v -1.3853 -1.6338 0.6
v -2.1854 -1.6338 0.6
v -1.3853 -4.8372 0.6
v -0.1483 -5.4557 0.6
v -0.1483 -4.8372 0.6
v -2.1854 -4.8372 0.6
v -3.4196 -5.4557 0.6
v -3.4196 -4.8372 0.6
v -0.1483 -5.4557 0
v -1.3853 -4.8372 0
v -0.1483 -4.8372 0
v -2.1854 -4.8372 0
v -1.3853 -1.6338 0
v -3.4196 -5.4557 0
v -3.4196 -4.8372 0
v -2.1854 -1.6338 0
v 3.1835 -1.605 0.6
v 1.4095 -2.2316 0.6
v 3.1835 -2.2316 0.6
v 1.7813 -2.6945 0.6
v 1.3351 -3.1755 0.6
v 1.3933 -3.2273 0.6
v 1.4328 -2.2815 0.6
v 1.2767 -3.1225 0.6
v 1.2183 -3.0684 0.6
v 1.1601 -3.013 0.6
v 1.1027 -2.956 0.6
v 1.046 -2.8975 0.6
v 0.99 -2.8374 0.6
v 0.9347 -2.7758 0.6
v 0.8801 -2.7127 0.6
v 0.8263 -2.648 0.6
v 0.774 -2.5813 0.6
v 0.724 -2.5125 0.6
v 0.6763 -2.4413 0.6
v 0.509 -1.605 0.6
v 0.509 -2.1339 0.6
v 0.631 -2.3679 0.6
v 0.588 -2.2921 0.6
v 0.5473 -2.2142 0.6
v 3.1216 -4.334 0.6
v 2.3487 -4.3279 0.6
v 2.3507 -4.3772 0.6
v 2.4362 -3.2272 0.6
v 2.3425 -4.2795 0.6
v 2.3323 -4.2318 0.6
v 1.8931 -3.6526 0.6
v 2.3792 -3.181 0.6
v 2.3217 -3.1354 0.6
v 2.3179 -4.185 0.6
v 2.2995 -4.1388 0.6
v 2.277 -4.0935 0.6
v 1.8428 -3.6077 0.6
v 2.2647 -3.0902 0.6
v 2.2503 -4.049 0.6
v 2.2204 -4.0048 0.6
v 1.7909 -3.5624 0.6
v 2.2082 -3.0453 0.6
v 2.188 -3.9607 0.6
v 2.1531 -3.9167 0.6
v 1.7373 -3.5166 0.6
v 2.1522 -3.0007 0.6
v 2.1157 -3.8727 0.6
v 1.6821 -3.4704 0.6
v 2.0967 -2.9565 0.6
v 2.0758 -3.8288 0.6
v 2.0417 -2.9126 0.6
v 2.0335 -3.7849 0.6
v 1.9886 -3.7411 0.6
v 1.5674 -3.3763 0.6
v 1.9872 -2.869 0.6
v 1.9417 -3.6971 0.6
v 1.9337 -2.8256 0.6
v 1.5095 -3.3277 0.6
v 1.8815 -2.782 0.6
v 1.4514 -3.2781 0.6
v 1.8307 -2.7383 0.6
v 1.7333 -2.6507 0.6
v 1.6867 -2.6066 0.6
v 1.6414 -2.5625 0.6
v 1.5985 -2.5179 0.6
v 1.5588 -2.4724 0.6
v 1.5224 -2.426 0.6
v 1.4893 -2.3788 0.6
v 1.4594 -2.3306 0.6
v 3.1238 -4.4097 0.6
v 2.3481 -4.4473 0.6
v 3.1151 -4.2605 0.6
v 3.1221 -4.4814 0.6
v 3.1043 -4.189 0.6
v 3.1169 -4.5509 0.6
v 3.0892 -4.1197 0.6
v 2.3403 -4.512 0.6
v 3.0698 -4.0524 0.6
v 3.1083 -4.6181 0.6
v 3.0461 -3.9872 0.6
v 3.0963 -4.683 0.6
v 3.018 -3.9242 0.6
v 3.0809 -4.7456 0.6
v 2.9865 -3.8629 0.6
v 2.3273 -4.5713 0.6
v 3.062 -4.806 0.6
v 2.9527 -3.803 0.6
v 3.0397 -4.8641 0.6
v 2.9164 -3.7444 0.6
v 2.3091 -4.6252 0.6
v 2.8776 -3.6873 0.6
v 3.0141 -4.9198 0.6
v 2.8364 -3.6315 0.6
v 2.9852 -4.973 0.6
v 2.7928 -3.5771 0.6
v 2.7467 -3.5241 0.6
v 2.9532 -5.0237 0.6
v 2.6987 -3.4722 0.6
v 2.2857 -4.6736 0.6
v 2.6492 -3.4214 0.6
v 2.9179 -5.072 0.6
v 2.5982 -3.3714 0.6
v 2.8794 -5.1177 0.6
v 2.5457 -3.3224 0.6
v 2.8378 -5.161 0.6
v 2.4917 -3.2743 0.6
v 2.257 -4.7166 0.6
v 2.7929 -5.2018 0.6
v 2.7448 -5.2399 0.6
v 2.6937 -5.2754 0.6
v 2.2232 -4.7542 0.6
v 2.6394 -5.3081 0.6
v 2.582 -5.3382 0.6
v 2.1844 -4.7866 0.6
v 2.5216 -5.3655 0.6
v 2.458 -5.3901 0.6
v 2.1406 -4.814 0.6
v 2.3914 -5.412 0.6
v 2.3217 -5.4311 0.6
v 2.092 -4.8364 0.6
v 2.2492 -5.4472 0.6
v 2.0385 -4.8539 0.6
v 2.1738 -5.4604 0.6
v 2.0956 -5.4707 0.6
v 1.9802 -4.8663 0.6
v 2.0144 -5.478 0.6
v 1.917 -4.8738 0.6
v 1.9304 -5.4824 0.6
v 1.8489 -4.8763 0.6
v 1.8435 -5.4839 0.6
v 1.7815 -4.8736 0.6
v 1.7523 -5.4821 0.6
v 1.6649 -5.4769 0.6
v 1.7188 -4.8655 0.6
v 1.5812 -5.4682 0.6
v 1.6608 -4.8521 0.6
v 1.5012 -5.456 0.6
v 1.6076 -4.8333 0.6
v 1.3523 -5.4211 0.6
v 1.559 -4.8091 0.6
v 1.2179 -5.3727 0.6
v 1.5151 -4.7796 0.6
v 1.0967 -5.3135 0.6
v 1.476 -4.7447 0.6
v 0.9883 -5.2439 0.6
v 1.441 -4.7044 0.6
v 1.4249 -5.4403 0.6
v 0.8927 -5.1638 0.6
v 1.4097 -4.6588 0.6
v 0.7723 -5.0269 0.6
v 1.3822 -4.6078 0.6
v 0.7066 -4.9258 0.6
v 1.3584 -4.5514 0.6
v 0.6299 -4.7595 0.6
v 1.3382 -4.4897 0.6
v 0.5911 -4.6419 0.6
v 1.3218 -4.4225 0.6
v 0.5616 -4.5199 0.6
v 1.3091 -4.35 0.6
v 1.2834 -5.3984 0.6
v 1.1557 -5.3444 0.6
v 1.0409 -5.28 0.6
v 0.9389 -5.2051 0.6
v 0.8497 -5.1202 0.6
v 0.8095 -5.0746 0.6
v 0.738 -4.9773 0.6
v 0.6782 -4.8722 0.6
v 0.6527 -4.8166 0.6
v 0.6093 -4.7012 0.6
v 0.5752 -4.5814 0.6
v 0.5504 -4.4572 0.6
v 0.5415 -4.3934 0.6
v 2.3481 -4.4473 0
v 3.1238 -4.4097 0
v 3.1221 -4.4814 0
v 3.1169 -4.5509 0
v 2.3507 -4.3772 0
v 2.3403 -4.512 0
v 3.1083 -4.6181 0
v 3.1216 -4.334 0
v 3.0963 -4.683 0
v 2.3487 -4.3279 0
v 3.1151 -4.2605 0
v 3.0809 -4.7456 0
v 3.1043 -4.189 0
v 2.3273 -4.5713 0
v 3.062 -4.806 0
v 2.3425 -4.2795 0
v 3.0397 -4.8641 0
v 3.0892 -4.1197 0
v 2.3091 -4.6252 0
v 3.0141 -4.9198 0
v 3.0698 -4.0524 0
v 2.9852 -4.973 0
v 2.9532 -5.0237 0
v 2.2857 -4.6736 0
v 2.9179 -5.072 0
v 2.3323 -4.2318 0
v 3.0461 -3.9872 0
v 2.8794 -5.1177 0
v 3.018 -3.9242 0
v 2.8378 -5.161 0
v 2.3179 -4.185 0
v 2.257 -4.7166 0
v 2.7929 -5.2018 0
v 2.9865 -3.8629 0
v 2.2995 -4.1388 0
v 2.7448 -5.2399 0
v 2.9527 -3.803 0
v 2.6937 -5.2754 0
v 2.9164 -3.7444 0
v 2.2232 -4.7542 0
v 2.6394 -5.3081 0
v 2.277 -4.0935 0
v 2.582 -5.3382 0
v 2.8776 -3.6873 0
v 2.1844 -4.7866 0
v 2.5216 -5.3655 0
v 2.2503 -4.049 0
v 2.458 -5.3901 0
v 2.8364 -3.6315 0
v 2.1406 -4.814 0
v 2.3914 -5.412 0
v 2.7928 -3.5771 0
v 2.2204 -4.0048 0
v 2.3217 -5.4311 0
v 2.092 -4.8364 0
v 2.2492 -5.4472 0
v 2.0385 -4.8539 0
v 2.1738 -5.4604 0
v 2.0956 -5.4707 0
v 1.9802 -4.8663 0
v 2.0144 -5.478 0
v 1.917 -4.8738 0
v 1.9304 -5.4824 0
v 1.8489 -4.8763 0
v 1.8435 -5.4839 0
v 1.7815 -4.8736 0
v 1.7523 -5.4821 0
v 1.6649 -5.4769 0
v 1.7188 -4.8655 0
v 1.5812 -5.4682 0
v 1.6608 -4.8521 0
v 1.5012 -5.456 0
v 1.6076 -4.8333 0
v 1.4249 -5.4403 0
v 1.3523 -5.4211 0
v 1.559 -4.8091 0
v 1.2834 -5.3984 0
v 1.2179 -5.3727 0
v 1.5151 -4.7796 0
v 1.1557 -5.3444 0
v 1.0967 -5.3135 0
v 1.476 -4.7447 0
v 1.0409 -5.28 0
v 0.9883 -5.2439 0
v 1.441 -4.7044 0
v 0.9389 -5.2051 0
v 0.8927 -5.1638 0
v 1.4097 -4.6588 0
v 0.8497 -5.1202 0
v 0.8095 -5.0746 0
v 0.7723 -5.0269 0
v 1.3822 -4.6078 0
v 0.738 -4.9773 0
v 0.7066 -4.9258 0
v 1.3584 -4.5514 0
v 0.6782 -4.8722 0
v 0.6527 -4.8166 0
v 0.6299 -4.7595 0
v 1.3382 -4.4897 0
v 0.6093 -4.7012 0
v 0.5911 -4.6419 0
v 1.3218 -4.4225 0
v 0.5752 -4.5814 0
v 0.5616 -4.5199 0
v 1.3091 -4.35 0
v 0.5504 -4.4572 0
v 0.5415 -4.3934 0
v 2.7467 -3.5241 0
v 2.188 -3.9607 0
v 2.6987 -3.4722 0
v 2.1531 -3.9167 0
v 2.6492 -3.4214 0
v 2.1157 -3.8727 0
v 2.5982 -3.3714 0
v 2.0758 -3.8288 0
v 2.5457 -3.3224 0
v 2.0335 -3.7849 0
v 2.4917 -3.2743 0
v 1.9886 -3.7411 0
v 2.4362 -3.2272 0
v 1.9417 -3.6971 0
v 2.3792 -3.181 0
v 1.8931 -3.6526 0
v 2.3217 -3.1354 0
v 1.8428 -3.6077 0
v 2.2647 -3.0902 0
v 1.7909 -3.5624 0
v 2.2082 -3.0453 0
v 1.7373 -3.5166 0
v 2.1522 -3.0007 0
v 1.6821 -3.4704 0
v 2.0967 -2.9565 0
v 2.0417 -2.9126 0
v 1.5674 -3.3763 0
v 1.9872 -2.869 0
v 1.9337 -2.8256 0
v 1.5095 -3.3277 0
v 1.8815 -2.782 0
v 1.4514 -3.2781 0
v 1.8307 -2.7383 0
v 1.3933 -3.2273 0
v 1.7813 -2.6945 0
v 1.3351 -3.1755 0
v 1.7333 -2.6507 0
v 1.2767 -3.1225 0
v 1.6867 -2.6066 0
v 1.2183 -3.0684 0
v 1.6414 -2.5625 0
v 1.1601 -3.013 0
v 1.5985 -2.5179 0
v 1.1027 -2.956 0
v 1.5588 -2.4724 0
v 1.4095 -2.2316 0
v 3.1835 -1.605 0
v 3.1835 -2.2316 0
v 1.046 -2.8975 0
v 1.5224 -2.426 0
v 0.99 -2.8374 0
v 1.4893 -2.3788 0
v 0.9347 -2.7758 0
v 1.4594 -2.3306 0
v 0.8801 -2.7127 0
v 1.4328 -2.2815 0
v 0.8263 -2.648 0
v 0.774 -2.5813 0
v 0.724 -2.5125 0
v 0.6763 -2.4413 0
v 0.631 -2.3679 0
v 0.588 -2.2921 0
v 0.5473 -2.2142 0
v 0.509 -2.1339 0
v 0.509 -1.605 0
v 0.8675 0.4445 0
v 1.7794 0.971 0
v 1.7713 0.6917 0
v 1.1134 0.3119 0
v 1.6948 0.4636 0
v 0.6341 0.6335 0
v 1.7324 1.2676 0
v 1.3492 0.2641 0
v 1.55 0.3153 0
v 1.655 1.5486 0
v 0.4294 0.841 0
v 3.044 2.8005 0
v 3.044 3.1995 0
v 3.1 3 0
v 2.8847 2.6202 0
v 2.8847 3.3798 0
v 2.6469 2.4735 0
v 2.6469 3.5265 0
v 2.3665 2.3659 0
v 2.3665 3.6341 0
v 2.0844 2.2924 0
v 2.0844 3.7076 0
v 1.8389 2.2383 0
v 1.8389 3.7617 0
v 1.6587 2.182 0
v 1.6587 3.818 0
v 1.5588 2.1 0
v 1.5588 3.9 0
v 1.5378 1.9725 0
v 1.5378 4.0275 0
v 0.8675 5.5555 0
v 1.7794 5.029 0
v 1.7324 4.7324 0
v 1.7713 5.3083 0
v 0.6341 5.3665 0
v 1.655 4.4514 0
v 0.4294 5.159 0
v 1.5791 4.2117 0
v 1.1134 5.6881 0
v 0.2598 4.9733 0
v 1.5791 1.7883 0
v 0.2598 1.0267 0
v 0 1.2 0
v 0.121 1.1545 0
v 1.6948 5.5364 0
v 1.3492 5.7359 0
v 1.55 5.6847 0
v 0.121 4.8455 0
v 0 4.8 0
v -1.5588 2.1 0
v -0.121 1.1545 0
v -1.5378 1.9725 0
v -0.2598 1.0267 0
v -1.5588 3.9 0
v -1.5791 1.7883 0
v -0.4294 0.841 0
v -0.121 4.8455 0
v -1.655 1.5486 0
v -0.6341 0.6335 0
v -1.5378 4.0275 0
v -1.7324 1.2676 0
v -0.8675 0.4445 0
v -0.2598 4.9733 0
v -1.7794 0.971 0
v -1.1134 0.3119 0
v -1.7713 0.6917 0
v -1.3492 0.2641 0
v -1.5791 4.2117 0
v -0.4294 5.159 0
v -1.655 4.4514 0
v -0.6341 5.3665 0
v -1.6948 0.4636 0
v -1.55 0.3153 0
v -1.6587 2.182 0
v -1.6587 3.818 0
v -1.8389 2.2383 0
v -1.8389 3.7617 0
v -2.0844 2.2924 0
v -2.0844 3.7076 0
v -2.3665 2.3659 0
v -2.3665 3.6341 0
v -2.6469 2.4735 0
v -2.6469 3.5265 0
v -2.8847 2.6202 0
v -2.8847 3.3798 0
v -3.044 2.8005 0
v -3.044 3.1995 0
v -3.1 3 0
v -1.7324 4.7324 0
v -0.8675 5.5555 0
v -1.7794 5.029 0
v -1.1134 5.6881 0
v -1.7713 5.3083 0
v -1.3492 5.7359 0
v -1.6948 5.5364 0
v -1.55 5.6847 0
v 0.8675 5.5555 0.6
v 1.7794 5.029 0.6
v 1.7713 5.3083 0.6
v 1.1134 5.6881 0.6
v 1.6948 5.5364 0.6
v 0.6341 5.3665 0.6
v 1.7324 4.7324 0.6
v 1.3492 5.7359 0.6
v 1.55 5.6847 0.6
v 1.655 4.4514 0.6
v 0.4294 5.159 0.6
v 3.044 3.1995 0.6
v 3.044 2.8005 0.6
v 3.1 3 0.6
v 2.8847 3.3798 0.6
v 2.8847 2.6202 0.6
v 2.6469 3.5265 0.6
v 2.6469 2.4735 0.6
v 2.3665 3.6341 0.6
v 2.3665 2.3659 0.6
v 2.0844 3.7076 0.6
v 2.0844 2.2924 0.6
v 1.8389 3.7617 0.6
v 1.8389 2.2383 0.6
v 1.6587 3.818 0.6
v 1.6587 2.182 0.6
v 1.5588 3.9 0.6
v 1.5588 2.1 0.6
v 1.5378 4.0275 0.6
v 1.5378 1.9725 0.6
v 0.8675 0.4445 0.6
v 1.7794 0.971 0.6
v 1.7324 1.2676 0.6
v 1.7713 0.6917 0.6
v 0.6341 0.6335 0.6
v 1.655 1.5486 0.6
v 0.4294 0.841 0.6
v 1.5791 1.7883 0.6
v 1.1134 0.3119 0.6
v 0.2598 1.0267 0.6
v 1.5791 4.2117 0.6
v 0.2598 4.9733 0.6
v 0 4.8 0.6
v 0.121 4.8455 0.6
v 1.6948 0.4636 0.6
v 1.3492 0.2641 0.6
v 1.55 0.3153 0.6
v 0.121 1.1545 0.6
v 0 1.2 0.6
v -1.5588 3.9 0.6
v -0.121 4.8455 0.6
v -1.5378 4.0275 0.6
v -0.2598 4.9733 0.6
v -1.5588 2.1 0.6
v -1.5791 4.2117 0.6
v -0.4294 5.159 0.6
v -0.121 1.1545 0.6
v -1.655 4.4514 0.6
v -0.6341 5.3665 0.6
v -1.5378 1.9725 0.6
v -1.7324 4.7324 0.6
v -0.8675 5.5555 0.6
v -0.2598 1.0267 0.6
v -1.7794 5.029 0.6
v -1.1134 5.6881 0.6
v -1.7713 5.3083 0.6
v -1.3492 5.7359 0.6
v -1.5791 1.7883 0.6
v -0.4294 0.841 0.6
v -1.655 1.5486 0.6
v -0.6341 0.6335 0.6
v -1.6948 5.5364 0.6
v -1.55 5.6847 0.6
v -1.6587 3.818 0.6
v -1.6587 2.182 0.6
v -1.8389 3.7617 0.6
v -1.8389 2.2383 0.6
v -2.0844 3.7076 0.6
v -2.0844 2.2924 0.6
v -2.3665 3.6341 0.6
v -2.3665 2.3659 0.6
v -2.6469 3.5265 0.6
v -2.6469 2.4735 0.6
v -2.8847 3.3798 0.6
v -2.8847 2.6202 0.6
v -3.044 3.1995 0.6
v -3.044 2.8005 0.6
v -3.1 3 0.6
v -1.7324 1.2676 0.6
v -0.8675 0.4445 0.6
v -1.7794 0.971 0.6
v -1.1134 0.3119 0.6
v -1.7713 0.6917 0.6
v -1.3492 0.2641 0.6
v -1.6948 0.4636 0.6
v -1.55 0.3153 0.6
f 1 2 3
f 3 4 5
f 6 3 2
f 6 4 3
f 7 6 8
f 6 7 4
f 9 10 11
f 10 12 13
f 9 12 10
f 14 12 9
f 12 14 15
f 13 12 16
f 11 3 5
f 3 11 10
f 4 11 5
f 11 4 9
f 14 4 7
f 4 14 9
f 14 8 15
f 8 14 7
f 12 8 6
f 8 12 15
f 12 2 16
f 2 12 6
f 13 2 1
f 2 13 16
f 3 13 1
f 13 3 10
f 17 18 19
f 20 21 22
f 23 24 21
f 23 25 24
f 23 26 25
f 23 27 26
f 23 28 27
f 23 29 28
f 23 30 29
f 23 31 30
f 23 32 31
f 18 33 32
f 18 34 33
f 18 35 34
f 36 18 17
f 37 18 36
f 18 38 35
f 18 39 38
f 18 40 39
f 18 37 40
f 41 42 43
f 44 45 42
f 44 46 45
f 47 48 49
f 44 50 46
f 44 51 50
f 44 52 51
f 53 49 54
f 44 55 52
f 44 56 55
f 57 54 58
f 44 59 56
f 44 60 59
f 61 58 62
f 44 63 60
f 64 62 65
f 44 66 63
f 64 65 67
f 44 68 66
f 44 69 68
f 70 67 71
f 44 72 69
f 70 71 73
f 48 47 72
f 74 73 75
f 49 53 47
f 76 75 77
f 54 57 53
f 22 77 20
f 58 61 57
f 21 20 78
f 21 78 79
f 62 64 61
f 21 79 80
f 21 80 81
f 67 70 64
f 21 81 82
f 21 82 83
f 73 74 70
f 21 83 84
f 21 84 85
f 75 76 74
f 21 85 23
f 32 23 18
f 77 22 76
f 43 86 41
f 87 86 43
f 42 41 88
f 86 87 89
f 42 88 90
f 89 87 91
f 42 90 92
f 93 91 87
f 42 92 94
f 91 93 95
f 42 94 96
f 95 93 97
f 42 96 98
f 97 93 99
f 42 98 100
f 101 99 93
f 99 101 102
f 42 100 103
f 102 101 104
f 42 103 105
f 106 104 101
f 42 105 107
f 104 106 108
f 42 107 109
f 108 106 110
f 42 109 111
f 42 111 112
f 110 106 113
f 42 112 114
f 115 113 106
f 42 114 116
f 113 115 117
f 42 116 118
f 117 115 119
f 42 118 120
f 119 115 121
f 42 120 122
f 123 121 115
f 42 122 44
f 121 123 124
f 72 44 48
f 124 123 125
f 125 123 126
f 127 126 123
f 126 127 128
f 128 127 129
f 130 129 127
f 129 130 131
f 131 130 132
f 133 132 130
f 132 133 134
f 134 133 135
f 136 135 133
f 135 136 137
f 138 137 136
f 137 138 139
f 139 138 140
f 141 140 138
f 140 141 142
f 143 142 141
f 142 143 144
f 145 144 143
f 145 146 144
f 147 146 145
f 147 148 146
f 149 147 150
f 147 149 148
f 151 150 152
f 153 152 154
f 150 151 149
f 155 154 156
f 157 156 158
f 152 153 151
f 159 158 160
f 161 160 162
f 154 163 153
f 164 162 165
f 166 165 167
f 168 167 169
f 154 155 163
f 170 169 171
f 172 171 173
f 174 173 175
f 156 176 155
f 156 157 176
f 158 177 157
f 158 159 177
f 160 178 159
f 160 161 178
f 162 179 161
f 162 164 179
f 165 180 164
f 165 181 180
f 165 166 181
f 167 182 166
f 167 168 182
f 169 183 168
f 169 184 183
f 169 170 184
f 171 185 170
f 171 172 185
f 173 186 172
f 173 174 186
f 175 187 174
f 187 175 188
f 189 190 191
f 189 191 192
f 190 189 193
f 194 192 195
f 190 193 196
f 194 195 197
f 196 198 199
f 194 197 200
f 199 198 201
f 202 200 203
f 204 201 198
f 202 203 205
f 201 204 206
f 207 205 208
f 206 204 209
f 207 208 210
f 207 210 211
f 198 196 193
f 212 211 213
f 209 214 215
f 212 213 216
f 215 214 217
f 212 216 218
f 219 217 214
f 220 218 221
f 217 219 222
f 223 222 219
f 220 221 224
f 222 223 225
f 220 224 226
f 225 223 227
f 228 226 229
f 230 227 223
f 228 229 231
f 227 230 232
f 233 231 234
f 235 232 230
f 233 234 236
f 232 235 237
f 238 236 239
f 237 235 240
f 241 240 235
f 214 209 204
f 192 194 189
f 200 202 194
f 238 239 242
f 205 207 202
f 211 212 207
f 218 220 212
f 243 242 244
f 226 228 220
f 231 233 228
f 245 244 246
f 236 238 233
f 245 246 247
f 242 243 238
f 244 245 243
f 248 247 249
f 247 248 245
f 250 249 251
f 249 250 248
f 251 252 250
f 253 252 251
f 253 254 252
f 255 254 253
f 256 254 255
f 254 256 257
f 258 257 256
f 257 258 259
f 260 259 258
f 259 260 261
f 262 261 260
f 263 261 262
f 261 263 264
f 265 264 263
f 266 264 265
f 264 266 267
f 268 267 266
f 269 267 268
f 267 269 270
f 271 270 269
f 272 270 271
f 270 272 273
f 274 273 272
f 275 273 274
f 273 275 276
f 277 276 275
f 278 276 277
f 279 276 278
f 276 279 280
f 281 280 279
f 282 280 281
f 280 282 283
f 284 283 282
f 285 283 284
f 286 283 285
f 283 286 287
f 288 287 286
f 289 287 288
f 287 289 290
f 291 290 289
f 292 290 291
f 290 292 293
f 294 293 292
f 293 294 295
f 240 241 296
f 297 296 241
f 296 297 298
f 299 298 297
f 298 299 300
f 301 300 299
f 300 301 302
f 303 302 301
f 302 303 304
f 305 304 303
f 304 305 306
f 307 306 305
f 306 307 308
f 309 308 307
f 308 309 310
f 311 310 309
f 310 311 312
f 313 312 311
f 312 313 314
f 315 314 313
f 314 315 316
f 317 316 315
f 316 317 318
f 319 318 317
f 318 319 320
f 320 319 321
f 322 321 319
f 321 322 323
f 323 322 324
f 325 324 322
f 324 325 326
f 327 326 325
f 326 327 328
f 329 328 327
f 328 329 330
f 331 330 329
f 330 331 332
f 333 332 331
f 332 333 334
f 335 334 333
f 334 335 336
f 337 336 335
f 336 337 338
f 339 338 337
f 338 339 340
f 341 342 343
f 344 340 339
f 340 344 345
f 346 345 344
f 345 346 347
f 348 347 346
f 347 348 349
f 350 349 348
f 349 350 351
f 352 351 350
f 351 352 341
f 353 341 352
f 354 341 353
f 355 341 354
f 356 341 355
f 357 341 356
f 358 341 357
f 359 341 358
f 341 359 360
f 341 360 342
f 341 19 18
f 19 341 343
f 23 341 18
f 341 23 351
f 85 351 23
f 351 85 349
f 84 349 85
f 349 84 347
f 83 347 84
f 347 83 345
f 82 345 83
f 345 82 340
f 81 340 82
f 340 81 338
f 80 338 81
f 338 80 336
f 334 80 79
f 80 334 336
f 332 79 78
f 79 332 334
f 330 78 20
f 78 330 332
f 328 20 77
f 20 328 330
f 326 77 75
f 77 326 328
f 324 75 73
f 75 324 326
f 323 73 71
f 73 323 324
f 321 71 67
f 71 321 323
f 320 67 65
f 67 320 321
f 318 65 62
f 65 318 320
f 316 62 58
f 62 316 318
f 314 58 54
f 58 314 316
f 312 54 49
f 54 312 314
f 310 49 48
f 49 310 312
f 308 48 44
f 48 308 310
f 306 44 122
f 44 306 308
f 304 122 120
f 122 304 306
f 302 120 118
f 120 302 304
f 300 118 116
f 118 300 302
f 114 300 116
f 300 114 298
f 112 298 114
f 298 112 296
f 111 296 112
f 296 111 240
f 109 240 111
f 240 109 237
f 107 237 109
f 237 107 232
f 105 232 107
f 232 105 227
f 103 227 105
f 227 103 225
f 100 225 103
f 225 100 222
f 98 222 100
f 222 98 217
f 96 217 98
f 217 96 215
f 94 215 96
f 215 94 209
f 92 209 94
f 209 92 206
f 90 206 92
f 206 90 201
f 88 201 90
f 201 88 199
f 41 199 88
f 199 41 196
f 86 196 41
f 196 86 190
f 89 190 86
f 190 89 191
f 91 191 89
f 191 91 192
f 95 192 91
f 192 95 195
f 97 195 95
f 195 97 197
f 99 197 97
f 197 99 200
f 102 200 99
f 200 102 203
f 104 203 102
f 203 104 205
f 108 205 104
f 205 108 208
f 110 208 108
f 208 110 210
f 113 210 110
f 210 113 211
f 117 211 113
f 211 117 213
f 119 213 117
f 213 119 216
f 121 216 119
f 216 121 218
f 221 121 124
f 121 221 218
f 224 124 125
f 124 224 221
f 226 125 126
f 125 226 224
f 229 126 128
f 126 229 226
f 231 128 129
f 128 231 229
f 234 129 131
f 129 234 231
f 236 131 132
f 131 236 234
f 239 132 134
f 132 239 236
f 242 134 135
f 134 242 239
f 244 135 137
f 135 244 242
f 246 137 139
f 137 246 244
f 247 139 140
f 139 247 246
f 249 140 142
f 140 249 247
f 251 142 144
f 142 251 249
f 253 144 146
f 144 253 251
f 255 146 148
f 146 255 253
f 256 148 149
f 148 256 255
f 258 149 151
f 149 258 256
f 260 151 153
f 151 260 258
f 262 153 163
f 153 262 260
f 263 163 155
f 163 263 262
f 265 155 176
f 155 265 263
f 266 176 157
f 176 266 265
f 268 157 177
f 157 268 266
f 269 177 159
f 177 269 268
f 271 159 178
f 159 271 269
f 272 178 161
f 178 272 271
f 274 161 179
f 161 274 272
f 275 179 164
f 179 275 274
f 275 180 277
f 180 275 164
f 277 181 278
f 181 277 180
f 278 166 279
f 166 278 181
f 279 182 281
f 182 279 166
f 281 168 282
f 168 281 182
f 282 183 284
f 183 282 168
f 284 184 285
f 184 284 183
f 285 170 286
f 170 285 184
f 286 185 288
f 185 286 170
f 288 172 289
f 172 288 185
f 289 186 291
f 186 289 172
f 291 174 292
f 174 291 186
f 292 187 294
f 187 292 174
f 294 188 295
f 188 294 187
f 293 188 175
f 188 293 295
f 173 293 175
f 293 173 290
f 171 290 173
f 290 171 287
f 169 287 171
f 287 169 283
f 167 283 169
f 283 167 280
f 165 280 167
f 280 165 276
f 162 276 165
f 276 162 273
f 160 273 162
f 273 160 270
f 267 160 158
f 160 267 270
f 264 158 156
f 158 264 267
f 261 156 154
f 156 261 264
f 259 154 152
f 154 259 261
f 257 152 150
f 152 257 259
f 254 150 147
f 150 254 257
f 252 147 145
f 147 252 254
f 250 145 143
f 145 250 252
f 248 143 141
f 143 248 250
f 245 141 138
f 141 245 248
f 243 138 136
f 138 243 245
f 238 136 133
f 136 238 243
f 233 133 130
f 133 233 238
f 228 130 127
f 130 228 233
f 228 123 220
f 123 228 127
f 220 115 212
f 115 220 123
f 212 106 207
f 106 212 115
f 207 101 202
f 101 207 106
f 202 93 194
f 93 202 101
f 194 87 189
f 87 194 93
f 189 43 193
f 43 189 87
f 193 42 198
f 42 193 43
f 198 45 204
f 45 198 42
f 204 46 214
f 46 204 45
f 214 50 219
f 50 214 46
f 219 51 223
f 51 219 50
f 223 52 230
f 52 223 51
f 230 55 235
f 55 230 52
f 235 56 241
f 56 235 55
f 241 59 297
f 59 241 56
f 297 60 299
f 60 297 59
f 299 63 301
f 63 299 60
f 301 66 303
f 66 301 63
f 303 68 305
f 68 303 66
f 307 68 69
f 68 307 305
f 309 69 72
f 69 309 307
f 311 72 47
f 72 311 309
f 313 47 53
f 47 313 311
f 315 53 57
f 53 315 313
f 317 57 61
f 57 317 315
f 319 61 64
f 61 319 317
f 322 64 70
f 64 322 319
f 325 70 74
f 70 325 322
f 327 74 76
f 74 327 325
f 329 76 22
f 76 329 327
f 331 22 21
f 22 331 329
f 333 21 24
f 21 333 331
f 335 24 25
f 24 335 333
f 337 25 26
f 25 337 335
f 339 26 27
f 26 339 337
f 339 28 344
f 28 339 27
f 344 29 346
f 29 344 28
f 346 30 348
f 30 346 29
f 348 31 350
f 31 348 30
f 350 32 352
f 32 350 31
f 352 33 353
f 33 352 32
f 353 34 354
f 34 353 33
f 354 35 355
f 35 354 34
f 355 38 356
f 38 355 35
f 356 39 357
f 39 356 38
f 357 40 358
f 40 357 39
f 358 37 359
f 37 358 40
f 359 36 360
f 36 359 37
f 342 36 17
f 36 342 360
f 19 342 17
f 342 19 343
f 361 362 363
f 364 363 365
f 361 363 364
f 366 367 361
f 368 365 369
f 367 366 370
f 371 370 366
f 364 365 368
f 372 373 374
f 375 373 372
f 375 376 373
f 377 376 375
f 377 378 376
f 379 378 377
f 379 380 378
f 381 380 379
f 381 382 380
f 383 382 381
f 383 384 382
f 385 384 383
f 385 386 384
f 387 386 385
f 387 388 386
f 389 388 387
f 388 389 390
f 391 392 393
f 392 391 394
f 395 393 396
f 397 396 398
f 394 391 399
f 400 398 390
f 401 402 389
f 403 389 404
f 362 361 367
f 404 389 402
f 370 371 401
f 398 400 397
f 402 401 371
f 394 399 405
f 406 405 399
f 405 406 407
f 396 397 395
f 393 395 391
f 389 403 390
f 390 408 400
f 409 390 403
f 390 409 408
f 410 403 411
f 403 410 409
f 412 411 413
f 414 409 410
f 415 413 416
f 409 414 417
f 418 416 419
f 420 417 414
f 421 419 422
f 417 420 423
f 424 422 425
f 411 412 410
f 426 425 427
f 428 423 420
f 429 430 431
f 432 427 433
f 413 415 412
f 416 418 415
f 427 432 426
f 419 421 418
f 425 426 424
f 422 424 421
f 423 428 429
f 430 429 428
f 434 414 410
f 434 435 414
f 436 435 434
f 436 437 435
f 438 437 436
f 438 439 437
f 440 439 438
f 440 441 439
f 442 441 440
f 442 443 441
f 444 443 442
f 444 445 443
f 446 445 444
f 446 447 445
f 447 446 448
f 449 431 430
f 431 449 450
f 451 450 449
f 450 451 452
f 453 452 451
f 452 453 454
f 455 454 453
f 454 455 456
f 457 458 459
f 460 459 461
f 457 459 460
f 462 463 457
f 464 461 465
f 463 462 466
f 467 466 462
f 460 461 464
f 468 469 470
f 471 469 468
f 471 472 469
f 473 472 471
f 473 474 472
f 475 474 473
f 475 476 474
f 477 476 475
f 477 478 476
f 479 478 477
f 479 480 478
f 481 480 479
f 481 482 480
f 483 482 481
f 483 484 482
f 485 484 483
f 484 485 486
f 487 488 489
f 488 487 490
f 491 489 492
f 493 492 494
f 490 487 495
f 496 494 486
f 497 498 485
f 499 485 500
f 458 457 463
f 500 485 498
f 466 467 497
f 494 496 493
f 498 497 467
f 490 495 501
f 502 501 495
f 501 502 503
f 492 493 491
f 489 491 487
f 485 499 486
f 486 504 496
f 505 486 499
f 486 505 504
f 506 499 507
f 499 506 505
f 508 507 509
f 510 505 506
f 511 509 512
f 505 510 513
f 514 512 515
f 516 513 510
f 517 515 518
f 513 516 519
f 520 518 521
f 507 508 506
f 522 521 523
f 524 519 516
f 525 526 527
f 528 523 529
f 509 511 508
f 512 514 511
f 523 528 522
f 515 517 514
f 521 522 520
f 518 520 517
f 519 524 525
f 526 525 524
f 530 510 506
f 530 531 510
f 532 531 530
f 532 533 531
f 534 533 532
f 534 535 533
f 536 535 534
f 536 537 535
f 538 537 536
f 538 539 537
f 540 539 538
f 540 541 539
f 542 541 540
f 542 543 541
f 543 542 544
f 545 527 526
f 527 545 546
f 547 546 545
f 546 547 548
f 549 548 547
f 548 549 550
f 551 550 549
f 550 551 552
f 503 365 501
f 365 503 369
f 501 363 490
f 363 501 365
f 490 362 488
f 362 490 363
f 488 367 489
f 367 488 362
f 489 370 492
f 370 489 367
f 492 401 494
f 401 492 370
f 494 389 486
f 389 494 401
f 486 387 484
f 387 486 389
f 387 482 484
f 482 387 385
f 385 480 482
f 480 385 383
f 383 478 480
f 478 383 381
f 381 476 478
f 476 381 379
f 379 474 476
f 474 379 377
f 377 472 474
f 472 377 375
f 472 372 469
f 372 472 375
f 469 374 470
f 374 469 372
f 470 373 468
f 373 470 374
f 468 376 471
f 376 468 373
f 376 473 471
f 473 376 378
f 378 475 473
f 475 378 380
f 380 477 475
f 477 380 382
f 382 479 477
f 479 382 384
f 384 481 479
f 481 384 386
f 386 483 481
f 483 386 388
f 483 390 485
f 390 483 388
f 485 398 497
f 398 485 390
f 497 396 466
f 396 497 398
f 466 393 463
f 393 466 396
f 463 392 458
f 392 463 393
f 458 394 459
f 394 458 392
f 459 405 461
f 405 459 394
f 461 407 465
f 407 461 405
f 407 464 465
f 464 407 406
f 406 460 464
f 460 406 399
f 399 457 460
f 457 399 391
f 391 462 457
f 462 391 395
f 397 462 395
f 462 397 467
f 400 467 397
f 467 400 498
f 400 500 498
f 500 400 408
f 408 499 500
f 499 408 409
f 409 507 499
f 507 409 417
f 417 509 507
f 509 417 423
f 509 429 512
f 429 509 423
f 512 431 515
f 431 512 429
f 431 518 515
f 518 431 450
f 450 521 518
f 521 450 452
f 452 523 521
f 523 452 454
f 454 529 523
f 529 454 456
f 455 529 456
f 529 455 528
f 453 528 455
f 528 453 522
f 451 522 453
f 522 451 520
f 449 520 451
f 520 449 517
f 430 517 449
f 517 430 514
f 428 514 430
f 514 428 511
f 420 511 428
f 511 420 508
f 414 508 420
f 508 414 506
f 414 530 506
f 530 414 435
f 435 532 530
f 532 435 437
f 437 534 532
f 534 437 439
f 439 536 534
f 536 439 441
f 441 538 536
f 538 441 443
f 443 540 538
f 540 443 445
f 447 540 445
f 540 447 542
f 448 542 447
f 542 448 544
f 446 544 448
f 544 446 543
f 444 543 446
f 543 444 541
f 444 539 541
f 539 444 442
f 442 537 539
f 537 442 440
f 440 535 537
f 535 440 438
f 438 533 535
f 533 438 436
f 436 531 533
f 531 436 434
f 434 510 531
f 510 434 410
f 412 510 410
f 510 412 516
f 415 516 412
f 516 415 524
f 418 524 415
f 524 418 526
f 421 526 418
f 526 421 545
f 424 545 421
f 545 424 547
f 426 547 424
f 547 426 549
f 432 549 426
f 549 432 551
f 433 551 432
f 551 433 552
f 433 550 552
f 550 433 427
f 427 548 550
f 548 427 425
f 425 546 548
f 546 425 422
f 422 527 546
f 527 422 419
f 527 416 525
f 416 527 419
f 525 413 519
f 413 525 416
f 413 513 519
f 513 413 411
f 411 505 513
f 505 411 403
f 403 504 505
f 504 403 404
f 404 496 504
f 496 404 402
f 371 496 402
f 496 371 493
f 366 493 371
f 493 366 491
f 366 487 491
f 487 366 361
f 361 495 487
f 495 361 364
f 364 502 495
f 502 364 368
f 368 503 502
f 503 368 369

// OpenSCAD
$fn = 50;

difference() {
	union() {
		translate(v = [-1.825, -3.5, 0.6]) {
			rotate(a = [180, 0, 0]) {
				linear_extrude(height = 0.6) {
					text(font = "Liberation Sans:style=Bold", halign = "center", size = 4.0, text = "T", valign = "center");
				}
			}
		}
		translate(v = [1.825, -3.5, 0.6]) {
			rotate(a = [180, 0, 0]) {
				linear_extrude(height = 0.6) {
					text(font = "Liberation Sans:style=Bold", halign = "center", size = 4.0, text = "2", valign = "center");
				}
			}
		}
		translate(v = [0, 3, 0]) {
			linear_extrude(height = 0.6) {
				polygon(points = [[3.1, 0.0], [3.0439902950186117, 0.1995136647114984], [2.8847272103883213, 0.3797815421059436], [2.646888617374527, 0.5264988810722369], [2.3665182744082176, 0.6341066605011758], [2.0844354103556904, 0.7075704773708675], [1.8388718910678303, 0.761685676746956], [1.658746676795018, 0.818003336606089], [1.55884572681199, 0.9], [1.5377850082788151, 1.0275150922444565], [1.5790750912955211, 1.211666933596394], [1.6549917135488983, 1.4513887792304347], [1.7324116139070416, 1.7324116139070416], [1.779405714759903, 2.0290233430980913], [1.7712640685463372, 2.3083562761315313], [1.6947790495515949, 2.5364160920036563], [1.5500000000000005, 2.68467875173176], [1.3492112454670173, 2.735929756715155], [1.1134631418419842, 2.688137818237475], [0.8674829026146248, 2.555522224170328], [0.6341066605011758, 2.3665182744082176], [0.42944369680679173, 2.1589592566013023], [0.2597967997723095, 1.9733526103433505], [0.120961668516203, 1.8455184288505457], [1.102182119232618e-16, 1.8000000000000003], [-0.12096166851620277, 1.8455184288505457], [-0.25979679977230924, 1.9733526103433503], [-0.42944369680679134, 2.158959256601302], [-0.6341066605011755, 2.366518274408217], [-0.8674829026146244, 2.555522224170328], [-1.1134631418419831, 2.688137818237475], [-1.3492112454670169, 2.735929756715155], [-1.5499999999999994, 2.68467875173176], [-1.6947790495515944, 2.536416092003656], [-1.7712640685463372, 2.3083562761315313], [-1.7794057147599032, 2.0290233430980913], [-1.7324116139070418, 1.732411613907042], [-1.6549917135488983, 1.4513887792304352], [-1.5790750912955214, 1.211666933596395], [-1.5377850082788156, 1.0275150922444576], [-1.55884572681199, 0.9], [-1.6587466767950174, 0.8180033366060897], [-1.8388718910678303, 0.7616856767469562], [-2.084435410355689, 0.7075704773708675], [-2.3665182744082154, 0.634106660501176], [-2.646888617374527, 0.5264988810722366], [-2.8847272103883204, 0.37978154210594467], [-3.0439902950186117, 0.1995136647114986], [-3.1, 3.796405077356795e-16], [-3.043990295018612, -0.19951366471149784], [-2.8847272103883213, -0.37978154210594417], [-2.646888617374528, -0.5264988810722362], [-2.366518274408217, -0.6341066605011759], [-2.0844354103556904, -0.7075704773708673], [-1.8388718910678312, -0.7616856767469561], [-1.6587466767950179, -0.8180033366060894], [-1.5588457268119902, -0.8999999999999996], [-1.5377850082788154, -1.0275150922444558], [-1.5790750912955211, -1.211666933596394], [-1.6549917135488978, -1.4513887792304343], [-1.7324116139070413, -1.7324116139070393], [-1.7794057147599032, -2.0290233430980904], [-1.7712640685463374, -2.30835627613153], [-1.6947790495515942, -2.5364160920036567], [-1.5500000000000014, -2.6846787517317594], [-1.349211245467018, -2.7359297567151555], [-1.1134631418419827, -2.688137818237474], [-0.8674829026146252, -2.5555222241703284], [-0.6341066605011755, -2.366518274408217], [-0.42944369680679256, -2.1589592566013027], [-0.2597967997723094, -1.973352610343351], [-0.12096166851620195, -1.8455184288505448], [-3.3065463576978537e-16, -1.8000000000000003], [0.12096166851620122, -1.8455184288505442], [0.2597967997723086, -1.9733526103433503], [0.4294436968067915, -2.1589592566013014], [0.6341066605011743, -2.3665182744082163], [0.8674829026146239, -2.5555222241703275], [1.1134631418419814, -2.688137818237473], [1.3492112454670167, -2.735929756715155], [1.5500000000000005, -2.68467875173176], [1.6947790495515938, -2.536416092003658], [1.7712640685463361, -2.3083562761315344], [1.7794057147599027, -2.0290233430980895], [1.732411613907041, -1.7324116139070416], [1.6549917135488992, -1.451388779230435], [1.5790750912955214, -1.2116669335963952], [1.5377850082788151, -1.0275150922444585], [1.5588457268119893, -0.9000000000000009], [1.658746676795018, -0.8180033366060894], [1.8388718910678303, -0.7616856767469555], [2.084435410355689, -0.7075704773708676], [2.366518274408215, -0.6341066605011774], [2.646888617374524, -0.5264988810722376], [2.8847272103883217, -0.37978154210594395], [3.0439902950186117, -0.1995136647114976]]);
			}
		}
	}
	union();
}
